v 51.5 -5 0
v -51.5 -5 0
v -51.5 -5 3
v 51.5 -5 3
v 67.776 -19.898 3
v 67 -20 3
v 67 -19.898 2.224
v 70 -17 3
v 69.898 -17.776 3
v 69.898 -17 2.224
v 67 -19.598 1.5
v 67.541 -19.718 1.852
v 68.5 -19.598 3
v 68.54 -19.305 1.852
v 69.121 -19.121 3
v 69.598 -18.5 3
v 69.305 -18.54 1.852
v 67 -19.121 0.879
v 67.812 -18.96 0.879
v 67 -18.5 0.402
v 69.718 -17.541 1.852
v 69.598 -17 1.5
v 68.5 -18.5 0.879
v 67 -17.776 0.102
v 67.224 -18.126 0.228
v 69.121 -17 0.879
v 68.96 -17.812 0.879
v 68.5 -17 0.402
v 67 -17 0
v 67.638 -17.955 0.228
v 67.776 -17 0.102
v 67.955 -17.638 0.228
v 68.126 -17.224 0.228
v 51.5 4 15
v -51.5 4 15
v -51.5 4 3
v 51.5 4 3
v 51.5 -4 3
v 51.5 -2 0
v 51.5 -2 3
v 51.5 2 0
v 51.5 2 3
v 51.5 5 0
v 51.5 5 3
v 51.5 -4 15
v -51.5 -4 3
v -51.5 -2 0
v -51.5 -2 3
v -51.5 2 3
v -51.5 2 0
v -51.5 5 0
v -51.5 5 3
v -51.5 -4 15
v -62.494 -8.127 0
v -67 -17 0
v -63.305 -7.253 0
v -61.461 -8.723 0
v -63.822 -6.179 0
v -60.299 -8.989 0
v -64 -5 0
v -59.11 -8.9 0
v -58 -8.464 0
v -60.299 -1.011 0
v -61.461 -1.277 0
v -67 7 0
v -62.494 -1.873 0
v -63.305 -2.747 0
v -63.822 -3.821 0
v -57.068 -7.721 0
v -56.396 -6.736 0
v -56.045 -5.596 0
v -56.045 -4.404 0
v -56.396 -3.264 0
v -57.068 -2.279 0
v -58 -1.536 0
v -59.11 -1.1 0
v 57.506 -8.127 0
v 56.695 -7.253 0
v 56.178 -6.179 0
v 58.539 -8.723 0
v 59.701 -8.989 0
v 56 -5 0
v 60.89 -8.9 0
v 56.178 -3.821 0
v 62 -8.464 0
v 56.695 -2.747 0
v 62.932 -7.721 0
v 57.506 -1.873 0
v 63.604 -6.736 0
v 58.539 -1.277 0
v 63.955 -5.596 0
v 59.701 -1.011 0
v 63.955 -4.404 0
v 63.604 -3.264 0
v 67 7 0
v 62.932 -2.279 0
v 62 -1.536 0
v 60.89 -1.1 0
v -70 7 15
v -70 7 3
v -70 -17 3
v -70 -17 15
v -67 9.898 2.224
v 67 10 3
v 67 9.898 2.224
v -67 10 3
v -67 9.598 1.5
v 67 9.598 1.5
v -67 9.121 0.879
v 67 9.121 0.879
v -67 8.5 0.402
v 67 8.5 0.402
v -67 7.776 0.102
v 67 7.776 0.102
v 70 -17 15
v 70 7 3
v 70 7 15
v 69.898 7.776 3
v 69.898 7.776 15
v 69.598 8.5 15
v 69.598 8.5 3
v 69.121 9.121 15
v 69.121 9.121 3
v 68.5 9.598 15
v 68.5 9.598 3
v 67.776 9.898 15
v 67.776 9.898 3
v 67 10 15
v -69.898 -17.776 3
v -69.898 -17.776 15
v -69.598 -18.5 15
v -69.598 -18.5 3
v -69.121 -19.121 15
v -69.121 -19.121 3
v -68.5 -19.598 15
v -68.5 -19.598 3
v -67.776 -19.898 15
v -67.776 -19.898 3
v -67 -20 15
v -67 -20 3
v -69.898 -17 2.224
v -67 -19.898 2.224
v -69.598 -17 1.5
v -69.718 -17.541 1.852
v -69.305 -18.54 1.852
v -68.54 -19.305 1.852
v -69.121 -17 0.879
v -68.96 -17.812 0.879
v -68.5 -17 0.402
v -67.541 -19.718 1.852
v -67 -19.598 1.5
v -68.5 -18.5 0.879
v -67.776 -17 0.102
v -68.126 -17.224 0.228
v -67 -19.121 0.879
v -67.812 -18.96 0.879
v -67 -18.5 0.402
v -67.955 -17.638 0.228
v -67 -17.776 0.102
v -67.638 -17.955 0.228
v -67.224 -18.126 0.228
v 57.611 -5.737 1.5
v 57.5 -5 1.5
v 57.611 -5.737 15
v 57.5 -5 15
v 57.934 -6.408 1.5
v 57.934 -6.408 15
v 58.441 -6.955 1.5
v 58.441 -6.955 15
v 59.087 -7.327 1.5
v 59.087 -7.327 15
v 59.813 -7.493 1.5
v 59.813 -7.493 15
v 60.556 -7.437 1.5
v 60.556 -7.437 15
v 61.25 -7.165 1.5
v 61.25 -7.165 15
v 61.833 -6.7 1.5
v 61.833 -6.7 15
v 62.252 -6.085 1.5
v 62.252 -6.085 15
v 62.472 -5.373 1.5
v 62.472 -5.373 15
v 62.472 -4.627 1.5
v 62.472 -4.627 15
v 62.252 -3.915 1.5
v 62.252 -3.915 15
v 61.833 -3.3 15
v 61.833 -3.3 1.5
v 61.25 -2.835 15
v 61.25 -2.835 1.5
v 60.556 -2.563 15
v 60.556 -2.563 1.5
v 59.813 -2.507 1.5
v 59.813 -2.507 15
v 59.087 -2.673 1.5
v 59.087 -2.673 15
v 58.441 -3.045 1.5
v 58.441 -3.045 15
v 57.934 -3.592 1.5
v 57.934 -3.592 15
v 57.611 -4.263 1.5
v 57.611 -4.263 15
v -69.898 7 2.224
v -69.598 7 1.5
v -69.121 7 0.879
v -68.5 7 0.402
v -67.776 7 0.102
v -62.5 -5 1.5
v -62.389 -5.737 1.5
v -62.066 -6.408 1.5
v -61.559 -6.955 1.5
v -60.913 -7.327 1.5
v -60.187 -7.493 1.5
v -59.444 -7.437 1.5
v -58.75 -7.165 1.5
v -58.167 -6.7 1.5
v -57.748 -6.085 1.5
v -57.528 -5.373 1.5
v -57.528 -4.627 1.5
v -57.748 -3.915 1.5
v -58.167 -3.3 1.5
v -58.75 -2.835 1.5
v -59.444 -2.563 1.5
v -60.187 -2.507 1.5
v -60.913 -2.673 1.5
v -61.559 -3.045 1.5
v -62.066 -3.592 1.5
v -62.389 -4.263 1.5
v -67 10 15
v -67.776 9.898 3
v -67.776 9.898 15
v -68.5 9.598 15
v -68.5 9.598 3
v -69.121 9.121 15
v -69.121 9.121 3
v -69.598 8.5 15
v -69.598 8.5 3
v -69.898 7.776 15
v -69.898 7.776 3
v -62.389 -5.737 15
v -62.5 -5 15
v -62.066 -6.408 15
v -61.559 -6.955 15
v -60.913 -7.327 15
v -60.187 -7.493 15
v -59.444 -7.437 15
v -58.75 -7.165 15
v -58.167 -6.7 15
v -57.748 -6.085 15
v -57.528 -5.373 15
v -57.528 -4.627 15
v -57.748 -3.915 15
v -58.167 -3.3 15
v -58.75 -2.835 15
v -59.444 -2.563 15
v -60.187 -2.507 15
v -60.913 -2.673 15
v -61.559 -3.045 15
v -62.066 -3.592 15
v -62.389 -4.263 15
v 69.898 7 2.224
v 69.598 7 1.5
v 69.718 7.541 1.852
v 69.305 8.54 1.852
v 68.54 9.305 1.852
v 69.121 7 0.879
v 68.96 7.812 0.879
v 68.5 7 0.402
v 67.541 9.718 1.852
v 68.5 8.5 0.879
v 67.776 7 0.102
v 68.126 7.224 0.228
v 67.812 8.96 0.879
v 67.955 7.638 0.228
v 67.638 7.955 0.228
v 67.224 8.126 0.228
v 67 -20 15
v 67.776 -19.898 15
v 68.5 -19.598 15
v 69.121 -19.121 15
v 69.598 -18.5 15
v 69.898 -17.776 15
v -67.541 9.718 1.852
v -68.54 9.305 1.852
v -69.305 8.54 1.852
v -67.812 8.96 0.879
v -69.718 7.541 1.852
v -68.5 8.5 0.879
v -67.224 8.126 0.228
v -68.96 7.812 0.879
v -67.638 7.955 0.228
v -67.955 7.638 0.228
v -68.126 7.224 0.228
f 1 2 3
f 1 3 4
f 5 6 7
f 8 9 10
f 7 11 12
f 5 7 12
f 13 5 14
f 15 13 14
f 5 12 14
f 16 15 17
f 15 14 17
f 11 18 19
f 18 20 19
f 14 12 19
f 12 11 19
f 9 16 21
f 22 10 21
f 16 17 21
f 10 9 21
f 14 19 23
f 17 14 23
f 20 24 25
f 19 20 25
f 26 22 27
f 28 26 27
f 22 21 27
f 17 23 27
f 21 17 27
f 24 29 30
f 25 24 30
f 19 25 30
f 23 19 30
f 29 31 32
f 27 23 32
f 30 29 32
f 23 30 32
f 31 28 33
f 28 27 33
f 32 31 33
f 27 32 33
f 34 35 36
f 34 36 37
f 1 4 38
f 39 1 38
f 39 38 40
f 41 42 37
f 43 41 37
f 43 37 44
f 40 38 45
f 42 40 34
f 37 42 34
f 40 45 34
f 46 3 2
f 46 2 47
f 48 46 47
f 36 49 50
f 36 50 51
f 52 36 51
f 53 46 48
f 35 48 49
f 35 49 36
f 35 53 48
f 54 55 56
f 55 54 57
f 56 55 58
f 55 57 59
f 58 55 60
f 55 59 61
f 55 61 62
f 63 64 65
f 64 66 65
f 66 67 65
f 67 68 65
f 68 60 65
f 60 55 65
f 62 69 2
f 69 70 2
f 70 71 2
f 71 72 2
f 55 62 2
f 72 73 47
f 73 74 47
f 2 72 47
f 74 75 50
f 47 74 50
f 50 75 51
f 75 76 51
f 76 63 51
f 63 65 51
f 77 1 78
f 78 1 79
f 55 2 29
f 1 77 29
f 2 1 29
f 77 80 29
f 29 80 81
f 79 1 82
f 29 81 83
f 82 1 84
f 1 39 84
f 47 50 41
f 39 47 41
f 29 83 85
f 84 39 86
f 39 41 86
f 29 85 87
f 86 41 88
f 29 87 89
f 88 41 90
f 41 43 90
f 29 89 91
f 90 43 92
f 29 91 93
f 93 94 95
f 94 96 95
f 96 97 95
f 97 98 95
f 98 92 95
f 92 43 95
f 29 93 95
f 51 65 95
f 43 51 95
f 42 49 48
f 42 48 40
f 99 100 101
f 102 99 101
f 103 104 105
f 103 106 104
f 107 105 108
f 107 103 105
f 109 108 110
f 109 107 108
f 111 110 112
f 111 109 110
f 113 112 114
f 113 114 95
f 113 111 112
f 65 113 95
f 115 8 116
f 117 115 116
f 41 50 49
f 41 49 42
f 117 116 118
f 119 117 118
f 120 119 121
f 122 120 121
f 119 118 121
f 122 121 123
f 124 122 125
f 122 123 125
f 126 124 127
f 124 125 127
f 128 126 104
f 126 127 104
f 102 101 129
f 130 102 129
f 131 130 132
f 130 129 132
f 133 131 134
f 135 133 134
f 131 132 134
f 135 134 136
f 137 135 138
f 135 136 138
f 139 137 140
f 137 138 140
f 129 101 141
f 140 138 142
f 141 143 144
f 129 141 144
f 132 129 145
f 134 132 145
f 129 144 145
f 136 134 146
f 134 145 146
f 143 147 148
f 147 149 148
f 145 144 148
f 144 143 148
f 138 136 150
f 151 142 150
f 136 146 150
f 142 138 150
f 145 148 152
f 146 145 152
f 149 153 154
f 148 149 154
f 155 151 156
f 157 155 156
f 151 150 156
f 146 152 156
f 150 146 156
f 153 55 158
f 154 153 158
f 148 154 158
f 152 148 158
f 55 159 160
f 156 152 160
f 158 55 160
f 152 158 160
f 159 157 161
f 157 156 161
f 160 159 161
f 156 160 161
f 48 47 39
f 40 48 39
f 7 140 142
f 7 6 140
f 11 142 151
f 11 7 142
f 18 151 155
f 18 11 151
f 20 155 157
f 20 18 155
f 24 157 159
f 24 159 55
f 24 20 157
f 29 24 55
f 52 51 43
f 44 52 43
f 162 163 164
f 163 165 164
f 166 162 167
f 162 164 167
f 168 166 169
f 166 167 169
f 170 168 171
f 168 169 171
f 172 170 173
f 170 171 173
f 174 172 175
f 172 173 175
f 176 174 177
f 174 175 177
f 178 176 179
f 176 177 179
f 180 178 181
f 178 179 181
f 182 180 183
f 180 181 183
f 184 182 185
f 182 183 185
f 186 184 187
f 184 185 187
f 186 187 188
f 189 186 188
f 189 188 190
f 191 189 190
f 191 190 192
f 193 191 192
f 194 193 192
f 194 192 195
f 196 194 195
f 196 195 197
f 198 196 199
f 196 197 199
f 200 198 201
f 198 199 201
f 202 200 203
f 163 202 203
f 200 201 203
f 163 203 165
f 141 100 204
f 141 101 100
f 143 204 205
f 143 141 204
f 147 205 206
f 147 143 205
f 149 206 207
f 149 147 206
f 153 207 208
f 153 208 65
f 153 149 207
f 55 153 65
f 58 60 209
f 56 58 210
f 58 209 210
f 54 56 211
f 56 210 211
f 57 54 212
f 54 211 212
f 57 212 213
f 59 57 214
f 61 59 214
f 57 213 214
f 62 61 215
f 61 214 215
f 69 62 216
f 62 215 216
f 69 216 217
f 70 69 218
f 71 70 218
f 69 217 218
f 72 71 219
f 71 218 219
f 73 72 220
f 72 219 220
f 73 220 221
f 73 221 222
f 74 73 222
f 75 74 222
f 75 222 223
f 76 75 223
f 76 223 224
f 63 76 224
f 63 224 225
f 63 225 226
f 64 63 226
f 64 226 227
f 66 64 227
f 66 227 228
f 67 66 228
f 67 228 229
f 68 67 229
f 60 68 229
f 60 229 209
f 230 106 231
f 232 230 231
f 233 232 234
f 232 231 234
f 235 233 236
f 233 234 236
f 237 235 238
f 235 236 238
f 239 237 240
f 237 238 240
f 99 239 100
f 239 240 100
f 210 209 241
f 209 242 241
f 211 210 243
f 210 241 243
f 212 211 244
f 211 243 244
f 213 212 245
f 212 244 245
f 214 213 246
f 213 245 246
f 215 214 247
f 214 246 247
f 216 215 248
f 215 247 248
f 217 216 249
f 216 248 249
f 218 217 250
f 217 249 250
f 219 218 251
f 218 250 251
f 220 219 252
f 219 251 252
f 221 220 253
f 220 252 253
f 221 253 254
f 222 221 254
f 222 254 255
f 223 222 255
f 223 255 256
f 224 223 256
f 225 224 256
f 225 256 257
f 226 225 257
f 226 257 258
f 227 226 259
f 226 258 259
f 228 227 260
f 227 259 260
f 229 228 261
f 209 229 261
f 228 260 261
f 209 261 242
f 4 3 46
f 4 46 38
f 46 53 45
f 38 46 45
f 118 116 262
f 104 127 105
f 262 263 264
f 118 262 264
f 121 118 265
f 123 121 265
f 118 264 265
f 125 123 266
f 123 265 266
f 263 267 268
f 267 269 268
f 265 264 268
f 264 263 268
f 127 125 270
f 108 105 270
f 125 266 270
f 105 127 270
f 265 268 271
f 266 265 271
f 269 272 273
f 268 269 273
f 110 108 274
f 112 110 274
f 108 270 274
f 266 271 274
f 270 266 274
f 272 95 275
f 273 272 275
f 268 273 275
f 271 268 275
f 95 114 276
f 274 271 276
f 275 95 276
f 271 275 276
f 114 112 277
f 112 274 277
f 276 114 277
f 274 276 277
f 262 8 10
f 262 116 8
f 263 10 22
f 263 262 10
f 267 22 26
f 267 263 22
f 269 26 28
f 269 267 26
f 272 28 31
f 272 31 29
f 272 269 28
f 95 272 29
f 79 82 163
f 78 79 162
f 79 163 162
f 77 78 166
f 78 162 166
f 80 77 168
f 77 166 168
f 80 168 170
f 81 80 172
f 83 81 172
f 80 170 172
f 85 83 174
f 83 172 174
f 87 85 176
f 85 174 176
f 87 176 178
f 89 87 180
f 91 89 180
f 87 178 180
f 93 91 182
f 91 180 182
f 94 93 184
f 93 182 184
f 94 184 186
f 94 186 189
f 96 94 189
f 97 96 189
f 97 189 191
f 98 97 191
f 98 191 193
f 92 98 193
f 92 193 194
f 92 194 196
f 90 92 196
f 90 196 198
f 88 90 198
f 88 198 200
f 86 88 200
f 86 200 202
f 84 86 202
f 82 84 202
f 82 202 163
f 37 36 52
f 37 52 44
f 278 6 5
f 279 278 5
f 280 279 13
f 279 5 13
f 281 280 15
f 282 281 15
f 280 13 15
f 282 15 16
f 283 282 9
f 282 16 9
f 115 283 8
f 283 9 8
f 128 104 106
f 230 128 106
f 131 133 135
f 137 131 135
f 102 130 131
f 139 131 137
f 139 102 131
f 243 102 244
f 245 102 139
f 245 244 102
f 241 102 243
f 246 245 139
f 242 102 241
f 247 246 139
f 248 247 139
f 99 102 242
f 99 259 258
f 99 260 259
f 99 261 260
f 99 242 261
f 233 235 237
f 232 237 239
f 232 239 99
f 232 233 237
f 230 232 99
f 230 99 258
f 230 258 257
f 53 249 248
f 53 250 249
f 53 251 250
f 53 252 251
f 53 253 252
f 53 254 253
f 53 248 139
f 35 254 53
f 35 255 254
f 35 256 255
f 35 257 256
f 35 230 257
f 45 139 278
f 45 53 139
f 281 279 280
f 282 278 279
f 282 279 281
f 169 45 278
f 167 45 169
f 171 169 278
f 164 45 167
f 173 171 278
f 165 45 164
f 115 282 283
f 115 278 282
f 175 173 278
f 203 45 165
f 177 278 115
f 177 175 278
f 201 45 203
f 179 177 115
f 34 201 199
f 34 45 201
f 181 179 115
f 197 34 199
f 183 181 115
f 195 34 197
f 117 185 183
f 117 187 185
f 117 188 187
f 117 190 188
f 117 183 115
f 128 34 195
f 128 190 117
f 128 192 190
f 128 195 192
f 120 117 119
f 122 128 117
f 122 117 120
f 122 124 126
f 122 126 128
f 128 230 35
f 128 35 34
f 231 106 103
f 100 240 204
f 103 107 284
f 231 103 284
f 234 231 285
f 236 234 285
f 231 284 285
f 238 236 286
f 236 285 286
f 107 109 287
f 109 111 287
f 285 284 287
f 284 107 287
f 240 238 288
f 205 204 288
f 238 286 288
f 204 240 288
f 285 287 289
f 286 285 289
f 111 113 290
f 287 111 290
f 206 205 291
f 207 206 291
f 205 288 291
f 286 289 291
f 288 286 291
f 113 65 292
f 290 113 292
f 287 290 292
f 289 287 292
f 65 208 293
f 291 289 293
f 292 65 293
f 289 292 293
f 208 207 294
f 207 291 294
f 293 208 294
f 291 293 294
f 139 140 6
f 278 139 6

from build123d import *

# Parameters (mm, degrees)
F1_DEPTH       = 15
F2_R           = 3
F3_W           = 103
F3_H           = 8
F4_DEPTH       = 12
F5_W           = 103
F5_H           = 3
F6_DEPTH       = 3
F8_D           = 5
F8_CSINK_D     = 8
F8_CSINK_ANGLE = 90


with BuildPart() as f1:
    # F0 (on Top) → F1 (new body)
    with BuildSketch(Plane.XY):
        with BuildLine():
            Line((-67, -20), (67, -20))
            ThreePointArc((67, -20), (69.1213203436, -19.1213203436), (70, -17))
            Line((70, -17), (70, 7))
            ThreePointArc((70, 7), (69.1213203436, 9.1213203436), (67, 10))
            Line((67, 10), (-67, 10))
            ThreePointArc((-67, 10), (-69.1213203436, 9.1213203436), (-70, 7))
            Line((-70, 7), (-70, -17))
            ThreePointArc((-70, -17), (-69.1213203436, -19.1213203436), (-67, -20))
        make_face()
    extrude(amount=F1_DEPTH)

    # F2
    f2_edges = [f1.edges().sort_by_distance(p)[0] for p in [
        (0, -20, 0),
        (69.12132, -19.12132, 0),
        (70, -5, 0),
        (69.12132, 9.12132, 0),
        (0, 10, 0),
        (-69.12132, 9.12132, 0),
        (-70, -5, 0),
        (-69.12132, -19.12132, 0),
    ]]
    fillet(f2_edges, radius=F2_R)

    # F3 (on face) → F4 (cut)
    with BuildSketch(Plane.XY.offset(15)):
        Rectangle(F3_W, F3_H)
    extrude(amount=-F4_DEPTH, mode=Mode.SUBTRACT)

    # F5 (on face) → F6 (cut)
    with BuildSketch(Plane(origin=(0, 0, 0), x_dir=(1, 0, 0), z_dir=(0, 0, -1))):
        with Locations((0, 3.5)):
            Rectangle(F5_W, F5_H)
        with Locations((0, -3.5)):
            Rectangle(F5_W, F5_H)
    extrude(amount=-F6_DEPTH, mode=Mode.SUBTRACT)

    # F8 (through all)
    with Locations(Plane(origin=(0, 0, 0), x_dir=(1, 0, 0), z_dir=(0, 0, -1))):
        with Locations((-60, 5), (60, 5)):
            CounterSinkHole(F8_D / 2, F8_CSINK_D / 2, counter_sink_angle=F8_CSINK_ANGLE)


solid = f1.part
